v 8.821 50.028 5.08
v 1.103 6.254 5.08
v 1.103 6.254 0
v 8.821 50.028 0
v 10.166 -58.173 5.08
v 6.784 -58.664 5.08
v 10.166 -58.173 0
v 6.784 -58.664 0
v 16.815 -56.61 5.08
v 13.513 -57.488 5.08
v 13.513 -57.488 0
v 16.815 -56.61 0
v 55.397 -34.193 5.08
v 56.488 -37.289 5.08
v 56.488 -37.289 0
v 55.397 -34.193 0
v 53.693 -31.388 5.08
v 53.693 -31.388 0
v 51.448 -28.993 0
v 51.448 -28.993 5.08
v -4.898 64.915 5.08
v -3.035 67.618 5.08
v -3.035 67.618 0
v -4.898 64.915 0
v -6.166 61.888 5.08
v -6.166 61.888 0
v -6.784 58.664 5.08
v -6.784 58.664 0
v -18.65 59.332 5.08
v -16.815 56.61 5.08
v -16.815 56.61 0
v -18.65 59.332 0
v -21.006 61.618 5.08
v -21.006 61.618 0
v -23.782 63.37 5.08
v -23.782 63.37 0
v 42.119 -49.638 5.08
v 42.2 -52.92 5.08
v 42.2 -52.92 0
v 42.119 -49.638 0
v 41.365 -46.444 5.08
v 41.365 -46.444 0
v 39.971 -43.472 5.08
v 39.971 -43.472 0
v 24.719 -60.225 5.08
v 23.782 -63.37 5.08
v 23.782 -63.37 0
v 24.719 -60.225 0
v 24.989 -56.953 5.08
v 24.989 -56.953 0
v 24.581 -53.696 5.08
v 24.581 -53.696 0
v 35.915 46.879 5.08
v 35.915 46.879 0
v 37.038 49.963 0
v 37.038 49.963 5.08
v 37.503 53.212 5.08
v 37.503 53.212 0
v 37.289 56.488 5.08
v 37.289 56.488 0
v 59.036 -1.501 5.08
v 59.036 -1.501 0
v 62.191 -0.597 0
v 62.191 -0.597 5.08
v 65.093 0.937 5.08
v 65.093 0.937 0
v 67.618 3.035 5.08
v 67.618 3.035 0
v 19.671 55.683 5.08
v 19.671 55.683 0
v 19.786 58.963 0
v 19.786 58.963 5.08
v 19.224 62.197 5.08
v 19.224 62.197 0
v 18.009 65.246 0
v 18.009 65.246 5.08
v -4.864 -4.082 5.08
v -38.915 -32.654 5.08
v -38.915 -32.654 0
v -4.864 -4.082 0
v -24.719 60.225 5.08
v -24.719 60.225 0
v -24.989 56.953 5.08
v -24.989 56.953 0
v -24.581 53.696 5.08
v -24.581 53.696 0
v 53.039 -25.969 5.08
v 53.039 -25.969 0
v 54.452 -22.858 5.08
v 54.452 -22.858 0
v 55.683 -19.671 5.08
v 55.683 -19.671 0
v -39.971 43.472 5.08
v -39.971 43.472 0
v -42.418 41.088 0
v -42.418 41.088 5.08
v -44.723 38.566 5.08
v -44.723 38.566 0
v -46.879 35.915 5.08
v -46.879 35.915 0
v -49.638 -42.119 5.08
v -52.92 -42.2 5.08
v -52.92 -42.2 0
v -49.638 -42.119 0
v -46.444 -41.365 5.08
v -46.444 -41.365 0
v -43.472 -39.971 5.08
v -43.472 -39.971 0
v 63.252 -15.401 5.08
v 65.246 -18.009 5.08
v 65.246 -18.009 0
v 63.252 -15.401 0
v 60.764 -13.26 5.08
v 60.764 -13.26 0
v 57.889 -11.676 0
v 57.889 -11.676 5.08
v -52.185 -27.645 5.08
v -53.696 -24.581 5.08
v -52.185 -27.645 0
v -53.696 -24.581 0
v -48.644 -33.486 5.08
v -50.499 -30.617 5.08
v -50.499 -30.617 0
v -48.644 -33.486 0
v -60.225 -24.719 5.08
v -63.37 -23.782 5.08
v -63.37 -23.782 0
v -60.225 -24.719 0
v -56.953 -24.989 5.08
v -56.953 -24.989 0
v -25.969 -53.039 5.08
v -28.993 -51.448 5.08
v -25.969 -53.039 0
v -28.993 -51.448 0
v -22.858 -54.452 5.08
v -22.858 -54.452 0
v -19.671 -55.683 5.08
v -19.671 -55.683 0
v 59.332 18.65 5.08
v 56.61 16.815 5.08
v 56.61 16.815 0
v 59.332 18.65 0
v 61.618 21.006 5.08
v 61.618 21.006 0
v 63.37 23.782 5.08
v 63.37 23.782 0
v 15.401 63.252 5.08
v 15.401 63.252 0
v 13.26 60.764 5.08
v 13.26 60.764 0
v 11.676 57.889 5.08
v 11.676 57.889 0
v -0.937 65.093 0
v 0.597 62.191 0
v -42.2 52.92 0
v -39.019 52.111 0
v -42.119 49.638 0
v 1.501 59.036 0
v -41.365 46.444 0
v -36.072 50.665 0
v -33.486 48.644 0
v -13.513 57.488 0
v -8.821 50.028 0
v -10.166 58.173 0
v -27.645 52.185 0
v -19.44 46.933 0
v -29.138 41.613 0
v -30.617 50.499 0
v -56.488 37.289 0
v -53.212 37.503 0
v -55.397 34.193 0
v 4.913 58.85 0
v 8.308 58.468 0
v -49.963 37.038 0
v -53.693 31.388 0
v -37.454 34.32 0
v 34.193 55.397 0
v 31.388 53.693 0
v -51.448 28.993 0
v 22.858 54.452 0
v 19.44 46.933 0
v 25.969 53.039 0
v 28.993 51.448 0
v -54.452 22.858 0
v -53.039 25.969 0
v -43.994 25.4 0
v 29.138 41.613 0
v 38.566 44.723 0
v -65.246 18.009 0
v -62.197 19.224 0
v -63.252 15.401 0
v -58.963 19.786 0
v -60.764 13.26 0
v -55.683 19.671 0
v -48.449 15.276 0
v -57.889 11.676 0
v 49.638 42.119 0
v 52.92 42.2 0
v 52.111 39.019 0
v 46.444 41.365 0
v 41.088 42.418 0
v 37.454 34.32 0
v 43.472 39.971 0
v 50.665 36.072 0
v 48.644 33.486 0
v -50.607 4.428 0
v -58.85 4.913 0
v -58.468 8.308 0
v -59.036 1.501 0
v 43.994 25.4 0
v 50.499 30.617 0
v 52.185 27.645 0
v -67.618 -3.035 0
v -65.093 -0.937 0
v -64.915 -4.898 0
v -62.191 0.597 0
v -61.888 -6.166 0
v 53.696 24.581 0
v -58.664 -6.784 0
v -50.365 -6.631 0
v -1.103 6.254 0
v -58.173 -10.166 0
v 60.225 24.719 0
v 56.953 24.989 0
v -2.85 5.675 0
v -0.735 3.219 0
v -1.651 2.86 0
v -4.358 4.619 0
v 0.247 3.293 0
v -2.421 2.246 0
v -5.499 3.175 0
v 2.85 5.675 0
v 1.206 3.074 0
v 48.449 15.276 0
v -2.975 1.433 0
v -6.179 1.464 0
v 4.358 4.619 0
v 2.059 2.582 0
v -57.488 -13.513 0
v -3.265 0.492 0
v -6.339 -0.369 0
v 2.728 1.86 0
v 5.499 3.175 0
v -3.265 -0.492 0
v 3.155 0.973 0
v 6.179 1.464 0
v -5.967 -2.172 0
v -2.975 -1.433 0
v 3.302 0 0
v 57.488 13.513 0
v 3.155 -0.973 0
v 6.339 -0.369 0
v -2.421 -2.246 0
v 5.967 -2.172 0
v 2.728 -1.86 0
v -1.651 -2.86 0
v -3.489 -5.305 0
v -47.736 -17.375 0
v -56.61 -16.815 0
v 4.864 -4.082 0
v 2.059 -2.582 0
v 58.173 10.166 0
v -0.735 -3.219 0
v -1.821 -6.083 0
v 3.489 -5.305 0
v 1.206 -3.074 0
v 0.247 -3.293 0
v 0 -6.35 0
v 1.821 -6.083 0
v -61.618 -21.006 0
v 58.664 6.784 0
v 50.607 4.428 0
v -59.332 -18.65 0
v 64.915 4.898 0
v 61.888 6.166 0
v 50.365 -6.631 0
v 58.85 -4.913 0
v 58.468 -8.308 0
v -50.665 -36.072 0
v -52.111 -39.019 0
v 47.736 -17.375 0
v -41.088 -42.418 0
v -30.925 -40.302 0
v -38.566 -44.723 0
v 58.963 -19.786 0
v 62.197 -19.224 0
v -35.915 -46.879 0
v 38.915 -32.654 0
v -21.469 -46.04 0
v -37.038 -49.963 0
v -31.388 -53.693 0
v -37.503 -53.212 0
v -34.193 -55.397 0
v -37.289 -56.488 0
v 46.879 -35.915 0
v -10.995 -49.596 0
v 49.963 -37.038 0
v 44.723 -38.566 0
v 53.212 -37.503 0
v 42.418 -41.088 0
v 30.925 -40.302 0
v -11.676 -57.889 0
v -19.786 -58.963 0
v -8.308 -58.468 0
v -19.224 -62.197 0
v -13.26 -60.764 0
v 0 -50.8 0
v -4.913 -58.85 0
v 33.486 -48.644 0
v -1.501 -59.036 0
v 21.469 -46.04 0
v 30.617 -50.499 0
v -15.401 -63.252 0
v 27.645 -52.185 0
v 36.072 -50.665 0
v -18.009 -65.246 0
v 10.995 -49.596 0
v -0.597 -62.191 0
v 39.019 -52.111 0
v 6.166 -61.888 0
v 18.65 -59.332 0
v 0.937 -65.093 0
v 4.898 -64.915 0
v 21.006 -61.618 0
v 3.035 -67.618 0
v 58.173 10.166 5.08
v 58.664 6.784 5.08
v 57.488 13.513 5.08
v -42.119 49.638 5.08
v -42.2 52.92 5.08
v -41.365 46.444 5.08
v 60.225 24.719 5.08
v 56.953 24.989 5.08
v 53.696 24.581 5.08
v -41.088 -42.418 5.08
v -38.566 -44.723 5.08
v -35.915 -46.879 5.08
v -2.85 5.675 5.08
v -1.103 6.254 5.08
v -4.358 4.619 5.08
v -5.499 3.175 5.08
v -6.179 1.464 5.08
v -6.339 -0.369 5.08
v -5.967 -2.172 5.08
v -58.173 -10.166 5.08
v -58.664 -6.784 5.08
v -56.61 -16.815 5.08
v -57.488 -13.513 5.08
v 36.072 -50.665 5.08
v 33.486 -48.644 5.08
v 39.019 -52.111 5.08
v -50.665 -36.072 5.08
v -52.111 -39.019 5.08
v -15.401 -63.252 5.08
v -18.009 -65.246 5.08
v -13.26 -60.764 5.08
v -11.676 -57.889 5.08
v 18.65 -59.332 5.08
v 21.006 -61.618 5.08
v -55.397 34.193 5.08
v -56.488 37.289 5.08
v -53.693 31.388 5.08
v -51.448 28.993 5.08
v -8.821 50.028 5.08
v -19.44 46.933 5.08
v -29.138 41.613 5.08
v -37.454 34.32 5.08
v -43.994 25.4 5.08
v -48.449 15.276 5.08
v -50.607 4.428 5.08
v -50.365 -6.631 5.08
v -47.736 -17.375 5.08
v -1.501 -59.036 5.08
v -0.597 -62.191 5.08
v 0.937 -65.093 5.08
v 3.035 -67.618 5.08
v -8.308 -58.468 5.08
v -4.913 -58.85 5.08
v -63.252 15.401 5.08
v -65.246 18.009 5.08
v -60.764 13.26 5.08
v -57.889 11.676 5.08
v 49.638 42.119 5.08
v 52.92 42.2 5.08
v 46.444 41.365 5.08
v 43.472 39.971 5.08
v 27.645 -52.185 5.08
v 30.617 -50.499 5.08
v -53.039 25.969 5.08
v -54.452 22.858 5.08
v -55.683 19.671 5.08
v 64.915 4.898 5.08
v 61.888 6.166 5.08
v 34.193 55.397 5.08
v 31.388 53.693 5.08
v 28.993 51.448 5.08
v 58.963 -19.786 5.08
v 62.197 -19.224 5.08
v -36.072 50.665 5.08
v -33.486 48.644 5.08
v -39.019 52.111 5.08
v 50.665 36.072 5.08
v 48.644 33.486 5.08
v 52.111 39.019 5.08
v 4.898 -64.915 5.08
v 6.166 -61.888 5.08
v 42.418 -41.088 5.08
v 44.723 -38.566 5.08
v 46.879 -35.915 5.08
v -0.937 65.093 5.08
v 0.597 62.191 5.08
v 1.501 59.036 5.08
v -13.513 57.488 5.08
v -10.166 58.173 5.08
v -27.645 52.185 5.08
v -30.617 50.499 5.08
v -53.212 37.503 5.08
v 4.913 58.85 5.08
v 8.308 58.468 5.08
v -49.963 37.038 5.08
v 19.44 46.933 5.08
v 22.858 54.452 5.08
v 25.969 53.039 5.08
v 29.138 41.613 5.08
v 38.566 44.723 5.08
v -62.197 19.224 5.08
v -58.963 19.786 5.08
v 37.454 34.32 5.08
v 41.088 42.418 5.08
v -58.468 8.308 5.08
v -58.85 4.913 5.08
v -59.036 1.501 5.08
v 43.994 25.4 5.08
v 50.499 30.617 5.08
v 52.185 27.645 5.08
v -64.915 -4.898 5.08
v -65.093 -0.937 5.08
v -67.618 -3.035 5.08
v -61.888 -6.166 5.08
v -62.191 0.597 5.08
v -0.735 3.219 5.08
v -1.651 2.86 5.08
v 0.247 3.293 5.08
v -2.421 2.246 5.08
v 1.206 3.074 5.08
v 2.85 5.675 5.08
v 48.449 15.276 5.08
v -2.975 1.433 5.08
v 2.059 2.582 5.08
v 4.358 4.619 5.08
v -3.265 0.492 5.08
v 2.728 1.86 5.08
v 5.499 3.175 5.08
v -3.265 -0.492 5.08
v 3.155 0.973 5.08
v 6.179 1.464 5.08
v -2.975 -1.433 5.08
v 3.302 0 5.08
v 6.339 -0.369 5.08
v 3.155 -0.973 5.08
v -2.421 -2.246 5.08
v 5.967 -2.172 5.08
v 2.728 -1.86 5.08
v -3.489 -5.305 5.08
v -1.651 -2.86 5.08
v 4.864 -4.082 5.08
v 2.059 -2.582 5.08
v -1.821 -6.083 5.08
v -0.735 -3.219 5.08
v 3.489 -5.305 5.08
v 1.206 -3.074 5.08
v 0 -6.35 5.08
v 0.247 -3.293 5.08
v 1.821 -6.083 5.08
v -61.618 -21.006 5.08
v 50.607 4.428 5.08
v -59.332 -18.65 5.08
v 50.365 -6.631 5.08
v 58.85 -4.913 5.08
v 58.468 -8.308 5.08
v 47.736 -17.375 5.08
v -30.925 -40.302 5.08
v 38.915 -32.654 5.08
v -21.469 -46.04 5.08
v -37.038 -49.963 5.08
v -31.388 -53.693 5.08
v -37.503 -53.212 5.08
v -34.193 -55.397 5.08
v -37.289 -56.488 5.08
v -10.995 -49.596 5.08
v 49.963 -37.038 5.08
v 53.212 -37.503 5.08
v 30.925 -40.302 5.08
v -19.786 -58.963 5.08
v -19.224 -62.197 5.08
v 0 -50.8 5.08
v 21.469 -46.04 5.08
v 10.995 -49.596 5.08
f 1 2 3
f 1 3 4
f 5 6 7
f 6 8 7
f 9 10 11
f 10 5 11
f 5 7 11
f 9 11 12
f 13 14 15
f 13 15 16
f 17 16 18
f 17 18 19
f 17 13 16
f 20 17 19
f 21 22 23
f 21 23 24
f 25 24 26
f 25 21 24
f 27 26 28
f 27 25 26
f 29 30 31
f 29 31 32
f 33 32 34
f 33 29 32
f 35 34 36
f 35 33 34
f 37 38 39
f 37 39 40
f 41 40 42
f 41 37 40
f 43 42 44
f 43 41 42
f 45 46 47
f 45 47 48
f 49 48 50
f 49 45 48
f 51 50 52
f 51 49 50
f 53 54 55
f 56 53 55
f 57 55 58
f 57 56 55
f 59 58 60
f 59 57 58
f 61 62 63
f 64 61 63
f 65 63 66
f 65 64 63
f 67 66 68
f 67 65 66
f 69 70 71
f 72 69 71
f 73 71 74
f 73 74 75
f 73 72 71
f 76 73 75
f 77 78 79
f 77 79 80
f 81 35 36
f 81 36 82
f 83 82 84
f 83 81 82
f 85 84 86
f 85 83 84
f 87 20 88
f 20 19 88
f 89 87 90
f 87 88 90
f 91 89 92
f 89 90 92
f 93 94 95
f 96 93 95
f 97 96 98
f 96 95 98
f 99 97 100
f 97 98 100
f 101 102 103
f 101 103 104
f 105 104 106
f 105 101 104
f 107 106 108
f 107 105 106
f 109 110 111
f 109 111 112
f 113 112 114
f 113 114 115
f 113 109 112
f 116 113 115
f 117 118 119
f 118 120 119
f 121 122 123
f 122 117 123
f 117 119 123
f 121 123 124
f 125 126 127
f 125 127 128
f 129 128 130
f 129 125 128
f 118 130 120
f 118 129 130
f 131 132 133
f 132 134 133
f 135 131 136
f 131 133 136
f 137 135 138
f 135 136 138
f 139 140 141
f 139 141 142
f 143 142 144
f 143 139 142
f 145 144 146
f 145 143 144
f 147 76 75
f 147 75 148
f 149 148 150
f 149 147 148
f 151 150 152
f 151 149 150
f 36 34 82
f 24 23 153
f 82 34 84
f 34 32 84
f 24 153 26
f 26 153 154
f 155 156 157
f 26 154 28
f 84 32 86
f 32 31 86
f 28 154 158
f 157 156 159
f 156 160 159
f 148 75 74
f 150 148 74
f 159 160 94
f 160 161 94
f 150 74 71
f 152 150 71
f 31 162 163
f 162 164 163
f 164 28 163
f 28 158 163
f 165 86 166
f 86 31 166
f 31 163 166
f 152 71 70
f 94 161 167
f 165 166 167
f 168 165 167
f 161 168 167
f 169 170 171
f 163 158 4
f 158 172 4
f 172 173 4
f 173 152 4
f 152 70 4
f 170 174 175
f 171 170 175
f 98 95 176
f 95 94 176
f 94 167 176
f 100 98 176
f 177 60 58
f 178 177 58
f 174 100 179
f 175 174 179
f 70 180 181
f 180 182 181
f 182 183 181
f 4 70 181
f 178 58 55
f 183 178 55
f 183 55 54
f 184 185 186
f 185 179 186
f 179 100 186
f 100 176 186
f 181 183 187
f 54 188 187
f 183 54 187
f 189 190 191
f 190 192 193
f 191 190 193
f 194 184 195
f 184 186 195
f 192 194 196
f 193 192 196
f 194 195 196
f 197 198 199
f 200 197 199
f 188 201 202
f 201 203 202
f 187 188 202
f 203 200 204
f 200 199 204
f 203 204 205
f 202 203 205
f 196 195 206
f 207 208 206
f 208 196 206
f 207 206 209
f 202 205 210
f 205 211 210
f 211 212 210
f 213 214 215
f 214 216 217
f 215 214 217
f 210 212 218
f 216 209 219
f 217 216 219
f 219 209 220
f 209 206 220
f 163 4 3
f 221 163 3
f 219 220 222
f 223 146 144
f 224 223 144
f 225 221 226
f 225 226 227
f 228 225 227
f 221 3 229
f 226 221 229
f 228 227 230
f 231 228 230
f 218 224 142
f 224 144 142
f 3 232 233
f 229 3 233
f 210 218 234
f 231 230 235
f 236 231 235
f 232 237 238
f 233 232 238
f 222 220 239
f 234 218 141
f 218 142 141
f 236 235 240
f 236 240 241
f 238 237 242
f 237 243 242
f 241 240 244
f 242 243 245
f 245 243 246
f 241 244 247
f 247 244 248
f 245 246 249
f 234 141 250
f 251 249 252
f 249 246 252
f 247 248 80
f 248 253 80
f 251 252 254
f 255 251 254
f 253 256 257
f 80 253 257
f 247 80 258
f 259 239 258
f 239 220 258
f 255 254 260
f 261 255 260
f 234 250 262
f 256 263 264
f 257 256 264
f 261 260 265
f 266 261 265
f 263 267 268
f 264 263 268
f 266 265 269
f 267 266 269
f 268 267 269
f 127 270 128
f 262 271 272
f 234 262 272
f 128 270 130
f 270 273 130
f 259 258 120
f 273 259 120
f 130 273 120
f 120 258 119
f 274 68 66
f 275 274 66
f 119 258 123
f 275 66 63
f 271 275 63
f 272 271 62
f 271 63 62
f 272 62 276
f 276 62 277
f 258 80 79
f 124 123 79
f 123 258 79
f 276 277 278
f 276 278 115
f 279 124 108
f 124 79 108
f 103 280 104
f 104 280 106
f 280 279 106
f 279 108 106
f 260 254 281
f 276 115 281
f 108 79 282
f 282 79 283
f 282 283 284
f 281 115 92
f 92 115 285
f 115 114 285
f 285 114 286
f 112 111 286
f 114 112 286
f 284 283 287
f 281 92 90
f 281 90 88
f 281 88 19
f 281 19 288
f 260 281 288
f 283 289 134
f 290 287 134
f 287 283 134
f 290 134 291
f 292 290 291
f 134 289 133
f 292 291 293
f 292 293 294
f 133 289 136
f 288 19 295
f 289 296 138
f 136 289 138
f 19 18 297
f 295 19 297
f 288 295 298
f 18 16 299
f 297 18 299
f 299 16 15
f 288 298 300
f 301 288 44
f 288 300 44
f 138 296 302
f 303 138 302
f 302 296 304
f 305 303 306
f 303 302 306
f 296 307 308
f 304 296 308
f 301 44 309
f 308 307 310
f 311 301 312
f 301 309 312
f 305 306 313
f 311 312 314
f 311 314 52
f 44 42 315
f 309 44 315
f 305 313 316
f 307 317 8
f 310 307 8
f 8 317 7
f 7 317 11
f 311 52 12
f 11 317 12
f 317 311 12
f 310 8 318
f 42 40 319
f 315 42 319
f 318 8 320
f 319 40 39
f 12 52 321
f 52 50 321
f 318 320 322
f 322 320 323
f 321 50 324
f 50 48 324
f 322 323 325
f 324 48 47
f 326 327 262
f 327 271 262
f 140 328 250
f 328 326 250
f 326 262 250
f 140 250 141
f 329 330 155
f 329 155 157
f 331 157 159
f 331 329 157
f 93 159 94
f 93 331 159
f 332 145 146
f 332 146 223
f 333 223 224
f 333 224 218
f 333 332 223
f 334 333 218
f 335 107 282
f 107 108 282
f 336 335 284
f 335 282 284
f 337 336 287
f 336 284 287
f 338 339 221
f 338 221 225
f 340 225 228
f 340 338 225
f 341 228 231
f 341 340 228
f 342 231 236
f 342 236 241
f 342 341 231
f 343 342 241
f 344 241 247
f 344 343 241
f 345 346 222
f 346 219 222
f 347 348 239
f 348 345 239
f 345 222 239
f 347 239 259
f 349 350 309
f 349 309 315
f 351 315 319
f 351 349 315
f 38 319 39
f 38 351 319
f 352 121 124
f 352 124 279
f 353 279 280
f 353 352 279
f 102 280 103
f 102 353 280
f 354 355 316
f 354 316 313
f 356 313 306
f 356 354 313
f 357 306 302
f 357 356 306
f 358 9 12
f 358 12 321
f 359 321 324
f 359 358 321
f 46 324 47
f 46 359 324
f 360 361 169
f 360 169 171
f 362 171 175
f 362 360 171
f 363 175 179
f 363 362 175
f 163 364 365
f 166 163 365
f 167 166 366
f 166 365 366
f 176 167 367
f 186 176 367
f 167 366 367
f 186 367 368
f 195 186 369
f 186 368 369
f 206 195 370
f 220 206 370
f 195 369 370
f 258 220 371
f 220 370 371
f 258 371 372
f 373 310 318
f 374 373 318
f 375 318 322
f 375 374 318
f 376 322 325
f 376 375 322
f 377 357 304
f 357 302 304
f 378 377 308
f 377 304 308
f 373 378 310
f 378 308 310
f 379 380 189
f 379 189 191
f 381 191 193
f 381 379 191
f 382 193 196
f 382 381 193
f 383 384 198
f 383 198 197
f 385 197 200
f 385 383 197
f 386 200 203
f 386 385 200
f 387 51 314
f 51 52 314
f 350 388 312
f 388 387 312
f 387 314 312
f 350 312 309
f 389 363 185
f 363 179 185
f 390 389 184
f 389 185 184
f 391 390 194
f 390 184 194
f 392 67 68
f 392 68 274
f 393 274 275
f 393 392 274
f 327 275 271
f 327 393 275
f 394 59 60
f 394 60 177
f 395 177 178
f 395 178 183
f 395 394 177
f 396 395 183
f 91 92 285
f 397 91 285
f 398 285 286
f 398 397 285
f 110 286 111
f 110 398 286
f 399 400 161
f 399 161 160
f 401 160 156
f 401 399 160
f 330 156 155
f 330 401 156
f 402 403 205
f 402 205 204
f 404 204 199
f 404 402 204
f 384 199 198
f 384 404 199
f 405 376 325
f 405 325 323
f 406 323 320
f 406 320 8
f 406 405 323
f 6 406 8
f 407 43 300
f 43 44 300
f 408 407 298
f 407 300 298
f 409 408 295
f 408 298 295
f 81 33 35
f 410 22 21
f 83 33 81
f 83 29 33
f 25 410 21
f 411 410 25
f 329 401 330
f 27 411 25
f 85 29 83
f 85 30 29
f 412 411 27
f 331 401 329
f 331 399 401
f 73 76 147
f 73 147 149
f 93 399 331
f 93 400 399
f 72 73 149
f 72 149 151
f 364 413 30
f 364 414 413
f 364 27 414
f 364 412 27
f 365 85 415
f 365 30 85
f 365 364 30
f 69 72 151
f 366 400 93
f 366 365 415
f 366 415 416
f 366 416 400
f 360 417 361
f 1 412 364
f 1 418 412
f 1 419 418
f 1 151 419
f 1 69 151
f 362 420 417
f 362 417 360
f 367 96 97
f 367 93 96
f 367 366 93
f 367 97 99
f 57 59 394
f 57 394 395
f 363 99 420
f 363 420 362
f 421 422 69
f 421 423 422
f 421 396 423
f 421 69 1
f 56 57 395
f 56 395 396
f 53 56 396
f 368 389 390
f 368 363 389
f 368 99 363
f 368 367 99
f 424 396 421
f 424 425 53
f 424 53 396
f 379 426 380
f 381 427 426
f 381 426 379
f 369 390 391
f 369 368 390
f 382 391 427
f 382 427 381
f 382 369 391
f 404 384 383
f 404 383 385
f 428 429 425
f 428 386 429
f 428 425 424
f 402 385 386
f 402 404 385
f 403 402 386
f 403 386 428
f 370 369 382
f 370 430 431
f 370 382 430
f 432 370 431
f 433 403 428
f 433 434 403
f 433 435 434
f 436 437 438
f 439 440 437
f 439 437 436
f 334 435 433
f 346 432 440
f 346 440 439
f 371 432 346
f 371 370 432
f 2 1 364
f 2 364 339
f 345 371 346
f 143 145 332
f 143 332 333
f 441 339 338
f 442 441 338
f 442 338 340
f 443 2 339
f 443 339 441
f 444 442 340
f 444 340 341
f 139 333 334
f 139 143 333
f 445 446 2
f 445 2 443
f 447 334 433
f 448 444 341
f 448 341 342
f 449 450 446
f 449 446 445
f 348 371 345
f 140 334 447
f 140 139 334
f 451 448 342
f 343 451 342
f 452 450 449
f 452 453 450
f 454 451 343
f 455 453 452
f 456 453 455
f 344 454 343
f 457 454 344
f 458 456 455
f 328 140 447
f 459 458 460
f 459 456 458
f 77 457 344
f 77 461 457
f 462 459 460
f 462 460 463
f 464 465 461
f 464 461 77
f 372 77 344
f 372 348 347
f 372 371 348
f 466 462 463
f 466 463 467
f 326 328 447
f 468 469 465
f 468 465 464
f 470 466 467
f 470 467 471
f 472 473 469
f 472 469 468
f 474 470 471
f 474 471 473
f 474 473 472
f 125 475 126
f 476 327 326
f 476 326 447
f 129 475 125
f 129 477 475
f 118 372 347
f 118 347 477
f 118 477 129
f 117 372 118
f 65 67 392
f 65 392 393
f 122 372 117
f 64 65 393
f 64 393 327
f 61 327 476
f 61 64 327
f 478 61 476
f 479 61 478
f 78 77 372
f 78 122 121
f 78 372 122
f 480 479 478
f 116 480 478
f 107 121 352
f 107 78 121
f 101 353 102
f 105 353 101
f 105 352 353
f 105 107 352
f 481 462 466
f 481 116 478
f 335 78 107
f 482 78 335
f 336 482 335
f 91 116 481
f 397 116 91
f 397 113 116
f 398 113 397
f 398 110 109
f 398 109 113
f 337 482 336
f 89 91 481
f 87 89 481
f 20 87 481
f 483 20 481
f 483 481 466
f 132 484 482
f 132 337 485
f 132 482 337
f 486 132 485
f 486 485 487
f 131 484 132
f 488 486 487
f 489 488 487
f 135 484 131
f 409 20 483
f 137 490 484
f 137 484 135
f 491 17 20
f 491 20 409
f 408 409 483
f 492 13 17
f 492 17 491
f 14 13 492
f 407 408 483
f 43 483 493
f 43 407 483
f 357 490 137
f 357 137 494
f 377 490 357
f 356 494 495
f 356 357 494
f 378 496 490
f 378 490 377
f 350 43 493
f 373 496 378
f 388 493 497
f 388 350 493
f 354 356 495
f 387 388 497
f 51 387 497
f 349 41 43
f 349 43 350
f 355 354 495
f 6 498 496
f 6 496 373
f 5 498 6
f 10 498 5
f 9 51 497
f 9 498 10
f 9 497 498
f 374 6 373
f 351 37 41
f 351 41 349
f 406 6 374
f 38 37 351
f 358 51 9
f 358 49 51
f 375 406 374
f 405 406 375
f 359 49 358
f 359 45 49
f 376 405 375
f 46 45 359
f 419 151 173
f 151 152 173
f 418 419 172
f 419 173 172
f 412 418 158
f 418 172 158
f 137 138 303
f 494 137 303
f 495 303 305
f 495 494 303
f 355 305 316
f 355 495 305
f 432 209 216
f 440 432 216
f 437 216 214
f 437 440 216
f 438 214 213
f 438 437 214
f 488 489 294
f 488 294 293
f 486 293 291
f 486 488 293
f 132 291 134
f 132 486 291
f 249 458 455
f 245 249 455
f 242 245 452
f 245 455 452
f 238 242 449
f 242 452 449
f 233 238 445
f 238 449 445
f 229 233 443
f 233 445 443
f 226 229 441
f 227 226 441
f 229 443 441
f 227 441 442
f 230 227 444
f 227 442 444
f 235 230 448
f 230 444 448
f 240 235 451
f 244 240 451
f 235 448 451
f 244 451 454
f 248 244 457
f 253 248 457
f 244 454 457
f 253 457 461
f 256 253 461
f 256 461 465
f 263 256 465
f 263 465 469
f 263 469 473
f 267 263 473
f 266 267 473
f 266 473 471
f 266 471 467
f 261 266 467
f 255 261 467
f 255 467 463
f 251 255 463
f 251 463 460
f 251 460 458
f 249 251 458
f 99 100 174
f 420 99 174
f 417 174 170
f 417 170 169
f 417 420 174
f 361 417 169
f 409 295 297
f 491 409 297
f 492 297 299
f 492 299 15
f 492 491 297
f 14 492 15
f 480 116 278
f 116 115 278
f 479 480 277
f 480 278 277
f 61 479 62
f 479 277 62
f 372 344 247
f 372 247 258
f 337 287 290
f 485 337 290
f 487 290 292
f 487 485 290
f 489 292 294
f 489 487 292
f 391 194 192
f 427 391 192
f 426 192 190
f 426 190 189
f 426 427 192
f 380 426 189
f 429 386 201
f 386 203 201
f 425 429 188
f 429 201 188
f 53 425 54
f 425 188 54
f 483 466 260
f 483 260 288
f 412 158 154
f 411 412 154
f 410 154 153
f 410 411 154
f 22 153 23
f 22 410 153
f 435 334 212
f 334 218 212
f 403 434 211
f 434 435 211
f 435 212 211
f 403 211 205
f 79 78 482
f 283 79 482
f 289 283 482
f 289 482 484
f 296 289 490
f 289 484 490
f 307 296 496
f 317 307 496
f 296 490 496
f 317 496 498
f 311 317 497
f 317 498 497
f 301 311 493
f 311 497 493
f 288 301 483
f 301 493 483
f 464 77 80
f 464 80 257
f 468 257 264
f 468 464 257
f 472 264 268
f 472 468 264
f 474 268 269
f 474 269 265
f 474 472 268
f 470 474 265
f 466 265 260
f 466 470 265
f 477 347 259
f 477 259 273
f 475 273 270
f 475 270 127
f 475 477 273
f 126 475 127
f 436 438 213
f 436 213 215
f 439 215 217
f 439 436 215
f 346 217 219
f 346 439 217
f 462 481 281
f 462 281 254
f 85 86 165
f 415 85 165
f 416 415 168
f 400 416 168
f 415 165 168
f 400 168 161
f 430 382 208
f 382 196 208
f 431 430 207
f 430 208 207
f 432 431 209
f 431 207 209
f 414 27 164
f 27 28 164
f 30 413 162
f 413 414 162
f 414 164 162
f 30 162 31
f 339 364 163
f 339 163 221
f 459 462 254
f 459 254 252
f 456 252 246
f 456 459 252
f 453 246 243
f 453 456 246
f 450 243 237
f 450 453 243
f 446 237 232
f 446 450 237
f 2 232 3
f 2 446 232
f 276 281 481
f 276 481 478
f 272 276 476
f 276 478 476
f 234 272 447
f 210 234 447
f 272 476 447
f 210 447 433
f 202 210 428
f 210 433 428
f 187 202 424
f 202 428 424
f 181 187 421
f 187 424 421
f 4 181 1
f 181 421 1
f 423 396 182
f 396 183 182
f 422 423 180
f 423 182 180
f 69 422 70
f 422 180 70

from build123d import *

# Parameters (mm, degrees)
F0_R      = 59.055
F1_DEPTH  = 5.08
F3_DEPTH  = 5.08
F4_COUNT  = 20
F5_R      = 50.8
F6_DEPTH  = 5.081
F7_DEPTH  = 5.081
F9_DEPTH  = 5.08
F10_COUNT = 3
F11_R     = 3.302
F12_DEPTH = 5.081


with BuildPart() as f1:
    # F0 (on Top) → F1 (new body)
    with BuildSketch(Plane.XY):
        Circle(F0_R)
    extrude(amount=F1_DEPTH)

    # F4: F3 ×20 about axis
    f4_axis = Axis((0, 0, 5.08), (0, 0, 1))


with BuildPart() as f3:
    # F2 (on face) → F3 (new body, through all)
    with BuildSketch(Plane.XY.offset(5.08)):
        with BuildLine():
            Line((-6.7921649906, 58.5710500385), (1.5174926213, 58.9440295875))
            ThreePointArc((1.5174926213, 58.9440295875), (-0.0730129244, 63.6408133417), (-3.035026947, 67.6177416104))
            ThreePointArc((-3.035026947, 67.6177416104), (-5.6288384248, 63.3914397349), (-6.7921649906, 58.5710500385))
        make_face()
    extrude(amount=-F3_DEPTH)


with BuildPart() as f1_1:
    add(f1.part)
    for i in range(1, F4_COUNT):
        add(f3.part.rotate(f4_axis, i * 360 / F4_COUNT))

    # F5 (on face) → F6 (cut, through all)
    with BuildSketch(Plane.XY.offset(5.08)):
        Circle(F5_R)
    extrude(amount=-F6_DEPTH, mode=Mode.SUBTRACT)

    # F5 (on face) → F7 (cut, through all)
    with BuildSketch(Plane.XY.offset(5.08)):
        Circle(F5_R)
    extrude(amount=-F7_DEPTH, mode=Mode.SUBTRACT)



with BuildPart() as f9:
    # F8 (on face) → F9 (new body, through all)
    with BuildSketch(Plane.XY.offset(5.08)):
        with BuildLine():
            Line((-8.8213274255, 50.028233853), (-1.1026659282, 6.2535292316))
            ThreePointArc((-1.1026659282, 6.2535292316), (0, -6.35), (1.1026659282, 6.2535292316))
            Line((1.1026659282, 6.2535292316), (8.8213274255, 50.028233853))
            ThreePointArc((8.8213274255, 50.028233853), (0, 50.8), (-8.8213274255, 50.028233853))
        make_face()
    extrude(amount=-F9_DEPTH)


with BuildPart() as f1_2:
    add(f1_1.part)

    add(f3.part)  # F10 merges F3

    add(f9.part)  # F10 merges F9
    # F10: F9 ×3 about axis
    f10_axis = Axis((0, 0, 5.08), (0, 0, 1))
    for i in range(1, F10_COUNT):
        add(f9.part.rotate(f10_axis, i * 360 / F10_COUNT))

    # F11 (on face) → F12 (cut, through all)
    with BuildSketch(Plane.XY.offset(5.08)):
        Circle(F11_R)
    extrude(amount=-F12_DEPTH, mode=Mode.SUBTRACT)


solid = f1_2.part
